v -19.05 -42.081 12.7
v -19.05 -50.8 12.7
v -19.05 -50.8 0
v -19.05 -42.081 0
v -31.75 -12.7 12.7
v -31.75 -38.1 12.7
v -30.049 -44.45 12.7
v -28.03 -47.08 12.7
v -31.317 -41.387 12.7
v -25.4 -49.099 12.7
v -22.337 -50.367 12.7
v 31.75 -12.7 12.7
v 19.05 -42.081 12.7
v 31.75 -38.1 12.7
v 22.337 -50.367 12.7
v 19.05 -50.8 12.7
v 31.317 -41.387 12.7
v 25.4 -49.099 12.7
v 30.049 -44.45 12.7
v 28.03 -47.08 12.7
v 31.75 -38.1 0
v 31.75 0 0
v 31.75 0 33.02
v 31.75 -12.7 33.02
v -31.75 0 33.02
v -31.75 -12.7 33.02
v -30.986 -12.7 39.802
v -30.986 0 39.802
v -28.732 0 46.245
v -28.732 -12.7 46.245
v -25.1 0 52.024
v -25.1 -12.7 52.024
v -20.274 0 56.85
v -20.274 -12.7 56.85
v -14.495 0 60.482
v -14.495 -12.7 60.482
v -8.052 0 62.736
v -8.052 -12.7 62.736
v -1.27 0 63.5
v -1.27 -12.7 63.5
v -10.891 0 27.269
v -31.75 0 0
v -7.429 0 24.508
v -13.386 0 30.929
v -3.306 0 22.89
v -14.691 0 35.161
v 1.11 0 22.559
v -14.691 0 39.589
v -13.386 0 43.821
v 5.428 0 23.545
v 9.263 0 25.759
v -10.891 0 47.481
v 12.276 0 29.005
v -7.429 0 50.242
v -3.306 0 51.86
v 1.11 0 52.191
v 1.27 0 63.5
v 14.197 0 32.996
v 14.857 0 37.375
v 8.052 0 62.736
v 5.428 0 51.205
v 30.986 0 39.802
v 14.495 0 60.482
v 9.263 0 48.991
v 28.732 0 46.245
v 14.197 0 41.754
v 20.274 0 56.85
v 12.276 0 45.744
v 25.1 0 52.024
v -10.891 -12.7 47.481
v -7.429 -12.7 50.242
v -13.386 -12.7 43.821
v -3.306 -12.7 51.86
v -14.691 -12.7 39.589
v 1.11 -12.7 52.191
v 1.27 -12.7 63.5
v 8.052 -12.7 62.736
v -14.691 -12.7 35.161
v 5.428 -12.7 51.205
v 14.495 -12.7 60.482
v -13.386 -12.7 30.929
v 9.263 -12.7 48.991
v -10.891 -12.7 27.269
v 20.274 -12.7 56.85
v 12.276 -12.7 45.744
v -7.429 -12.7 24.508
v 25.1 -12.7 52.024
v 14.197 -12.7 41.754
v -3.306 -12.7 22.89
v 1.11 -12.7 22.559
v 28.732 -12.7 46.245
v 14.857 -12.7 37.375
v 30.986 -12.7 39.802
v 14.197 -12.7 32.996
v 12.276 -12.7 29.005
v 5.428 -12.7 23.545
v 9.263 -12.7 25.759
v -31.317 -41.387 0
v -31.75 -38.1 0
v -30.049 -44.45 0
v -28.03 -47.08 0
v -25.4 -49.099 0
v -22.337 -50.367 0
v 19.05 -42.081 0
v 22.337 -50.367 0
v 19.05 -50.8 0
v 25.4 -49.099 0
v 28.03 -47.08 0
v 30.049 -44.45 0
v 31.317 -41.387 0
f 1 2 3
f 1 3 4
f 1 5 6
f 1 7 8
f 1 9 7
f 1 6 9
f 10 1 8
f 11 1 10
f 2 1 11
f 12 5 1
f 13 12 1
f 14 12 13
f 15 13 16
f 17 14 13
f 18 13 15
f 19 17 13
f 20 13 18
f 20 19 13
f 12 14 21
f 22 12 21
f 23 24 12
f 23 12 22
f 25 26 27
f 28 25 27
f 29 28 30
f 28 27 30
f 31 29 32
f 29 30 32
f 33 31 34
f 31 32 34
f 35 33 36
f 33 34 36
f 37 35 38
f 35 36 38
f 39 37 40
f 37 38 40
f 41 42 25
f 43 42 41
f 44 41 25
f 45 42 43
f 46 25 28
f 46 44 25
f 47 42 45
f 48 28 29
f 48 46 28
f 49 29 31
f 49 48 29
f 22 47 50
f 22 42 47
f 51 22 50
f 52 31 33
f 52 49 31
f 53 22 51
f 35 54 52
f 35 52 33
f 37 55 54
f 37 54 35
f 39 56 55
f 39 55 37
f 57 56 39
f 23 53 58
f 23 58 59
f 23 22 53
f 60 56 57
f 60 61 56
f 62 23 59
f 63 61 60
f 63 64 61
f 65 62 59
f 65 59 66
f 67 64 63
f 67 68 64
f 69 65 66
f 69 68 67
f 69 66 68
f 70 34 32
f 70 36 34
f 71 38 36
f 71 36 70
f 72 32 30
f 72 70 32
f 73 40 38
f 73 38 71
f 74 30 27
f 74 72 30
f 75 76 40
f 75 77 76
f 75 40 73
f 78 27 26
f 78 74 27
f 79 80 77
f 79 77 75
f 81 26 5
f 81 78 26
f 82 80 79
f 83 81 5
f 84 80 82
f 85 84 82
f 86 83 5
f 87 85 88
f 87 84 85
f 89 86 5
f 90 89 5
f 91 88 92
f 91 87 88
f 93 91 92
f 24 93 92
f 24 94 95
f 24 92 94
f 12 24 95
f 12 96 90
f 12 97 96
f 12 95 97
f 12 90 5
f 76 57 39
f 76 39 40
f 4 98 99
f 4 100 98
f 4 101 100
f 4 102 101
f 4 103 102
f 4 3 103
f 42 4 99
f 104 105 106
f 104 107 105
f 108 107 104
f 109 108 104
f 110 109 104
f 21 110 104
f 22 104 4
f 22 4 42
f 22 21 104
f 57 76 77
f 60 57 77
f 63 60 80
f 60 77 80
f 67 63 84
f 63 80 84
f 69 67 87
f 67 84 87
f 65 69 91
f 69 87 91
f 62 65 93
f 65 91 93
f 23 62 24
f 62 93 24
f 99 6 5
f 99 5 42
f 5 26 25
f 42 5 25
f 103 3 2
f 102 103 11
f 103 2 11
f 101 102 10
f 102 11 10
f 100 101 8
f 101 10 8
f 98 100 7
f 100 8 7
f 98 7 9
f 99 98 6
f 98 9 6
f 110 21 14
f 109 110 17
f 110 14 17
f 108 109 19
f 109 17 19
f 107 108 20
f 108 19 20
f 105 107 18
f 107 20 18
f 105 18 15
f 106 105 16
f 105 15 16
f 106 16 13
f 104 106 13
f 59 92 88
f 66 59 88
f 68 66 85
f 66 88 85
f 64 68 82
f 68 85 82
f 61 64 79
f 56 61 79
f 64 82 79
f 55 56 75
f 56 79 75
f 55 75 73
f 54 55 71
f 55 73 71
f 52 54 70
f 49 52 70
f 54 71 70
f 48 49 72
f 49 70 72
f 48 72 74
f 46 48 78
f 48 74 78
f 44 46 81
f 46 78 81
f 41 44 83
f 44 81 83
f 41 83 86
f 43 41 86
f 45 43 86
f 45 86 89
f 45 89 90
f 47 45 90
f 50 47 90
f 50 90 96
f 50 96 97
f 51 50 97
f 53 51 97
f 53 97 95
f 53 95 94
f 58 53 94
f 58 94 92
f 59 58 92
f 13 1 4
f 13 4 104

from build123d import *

# Parameters (mm, degrees)
F1_DEPTH = 31.75
F3_DEPTH = 25.4
F4_W     = 38.1
F4_H     = 8.718614
F5_DEPTH = 25.4
F6_R     = 14.857396
F7_DEPTH = 25.4


with BuildPart() as f1:
    # F0 (on Right) → F1 (new body, symmetric)
    with BuildSketch(Plane.YZ):
        Polygon((-50.8, 0), (0, 0), (0, 63.5), (-12.7, 63.5), (-12.7, 12.7), (-50.8, 12.7), align=None)
    extrude(amount=F1_DEPTH, both=True)

    # F2 (on face) → F3 (cut)
    with BuildSketch(Plane.XY.offset(12.7)):
        with BuildLine():
            ThreePointArc((-19.05, -50.8), (-28.030256, -47.080256), (-31.75, -38.1))
            Line((-31.75, -38.1), (-31.75, -50.8))
            Line((-31.75, -50.8), (-19.05, -50.8))
        make_face()
        with BuildLine():
            Line((31.75, -50.8), (31.75, -38.1))
            ThreePointArc((31.75, -38.1), (28.030256, -47.080256), (19.05, -50.8))
            Line((19.05, -50.8), (31.75, -50.8))
        make_face()
    extrude(amount=-F3_DEPTH, mode=Mode.SUBTRACT)

    # F4 (on face) → F5 (cut)
    with BuildSketch(Plane.XY.offset(12.7)):
        with Locations((0, -46.440693)):
            Rectangle(F4_W, F4_H)
    extrude(amount=-F5_DEPTH, mode=Mode.SUBTRACT)

    # F6 (on face) → F7 (cut)
    with BuildSketch(Plane.XZ.offset(12.7)):
        with BuildLine():
            Line((-31.75, 63.5), (-31.75, 33.02))
            ThreePointArc((-31.75, 33.02), (-22.822615, 54.572615), (-1.27, 63.5))
            Line((-1.27, 63.5), (-31.75, 63.5))
        make_face()
        with BuildLine():
            Line((31.75, 63.5), (1.27, 63.5))
            ThreePointArc((1.27, 63.5), (22.822615, 54.572615), (31.75, 33.02))
            Line((31.75, 33.02), (31.75, 63.5))
        make_face()
        with Locations((0, 37.374914)):
            Circle(F6_R)
    extrude(amount=-F7_DEPTH, mode=Mode.SUBTRACT)


solid = f1.part
